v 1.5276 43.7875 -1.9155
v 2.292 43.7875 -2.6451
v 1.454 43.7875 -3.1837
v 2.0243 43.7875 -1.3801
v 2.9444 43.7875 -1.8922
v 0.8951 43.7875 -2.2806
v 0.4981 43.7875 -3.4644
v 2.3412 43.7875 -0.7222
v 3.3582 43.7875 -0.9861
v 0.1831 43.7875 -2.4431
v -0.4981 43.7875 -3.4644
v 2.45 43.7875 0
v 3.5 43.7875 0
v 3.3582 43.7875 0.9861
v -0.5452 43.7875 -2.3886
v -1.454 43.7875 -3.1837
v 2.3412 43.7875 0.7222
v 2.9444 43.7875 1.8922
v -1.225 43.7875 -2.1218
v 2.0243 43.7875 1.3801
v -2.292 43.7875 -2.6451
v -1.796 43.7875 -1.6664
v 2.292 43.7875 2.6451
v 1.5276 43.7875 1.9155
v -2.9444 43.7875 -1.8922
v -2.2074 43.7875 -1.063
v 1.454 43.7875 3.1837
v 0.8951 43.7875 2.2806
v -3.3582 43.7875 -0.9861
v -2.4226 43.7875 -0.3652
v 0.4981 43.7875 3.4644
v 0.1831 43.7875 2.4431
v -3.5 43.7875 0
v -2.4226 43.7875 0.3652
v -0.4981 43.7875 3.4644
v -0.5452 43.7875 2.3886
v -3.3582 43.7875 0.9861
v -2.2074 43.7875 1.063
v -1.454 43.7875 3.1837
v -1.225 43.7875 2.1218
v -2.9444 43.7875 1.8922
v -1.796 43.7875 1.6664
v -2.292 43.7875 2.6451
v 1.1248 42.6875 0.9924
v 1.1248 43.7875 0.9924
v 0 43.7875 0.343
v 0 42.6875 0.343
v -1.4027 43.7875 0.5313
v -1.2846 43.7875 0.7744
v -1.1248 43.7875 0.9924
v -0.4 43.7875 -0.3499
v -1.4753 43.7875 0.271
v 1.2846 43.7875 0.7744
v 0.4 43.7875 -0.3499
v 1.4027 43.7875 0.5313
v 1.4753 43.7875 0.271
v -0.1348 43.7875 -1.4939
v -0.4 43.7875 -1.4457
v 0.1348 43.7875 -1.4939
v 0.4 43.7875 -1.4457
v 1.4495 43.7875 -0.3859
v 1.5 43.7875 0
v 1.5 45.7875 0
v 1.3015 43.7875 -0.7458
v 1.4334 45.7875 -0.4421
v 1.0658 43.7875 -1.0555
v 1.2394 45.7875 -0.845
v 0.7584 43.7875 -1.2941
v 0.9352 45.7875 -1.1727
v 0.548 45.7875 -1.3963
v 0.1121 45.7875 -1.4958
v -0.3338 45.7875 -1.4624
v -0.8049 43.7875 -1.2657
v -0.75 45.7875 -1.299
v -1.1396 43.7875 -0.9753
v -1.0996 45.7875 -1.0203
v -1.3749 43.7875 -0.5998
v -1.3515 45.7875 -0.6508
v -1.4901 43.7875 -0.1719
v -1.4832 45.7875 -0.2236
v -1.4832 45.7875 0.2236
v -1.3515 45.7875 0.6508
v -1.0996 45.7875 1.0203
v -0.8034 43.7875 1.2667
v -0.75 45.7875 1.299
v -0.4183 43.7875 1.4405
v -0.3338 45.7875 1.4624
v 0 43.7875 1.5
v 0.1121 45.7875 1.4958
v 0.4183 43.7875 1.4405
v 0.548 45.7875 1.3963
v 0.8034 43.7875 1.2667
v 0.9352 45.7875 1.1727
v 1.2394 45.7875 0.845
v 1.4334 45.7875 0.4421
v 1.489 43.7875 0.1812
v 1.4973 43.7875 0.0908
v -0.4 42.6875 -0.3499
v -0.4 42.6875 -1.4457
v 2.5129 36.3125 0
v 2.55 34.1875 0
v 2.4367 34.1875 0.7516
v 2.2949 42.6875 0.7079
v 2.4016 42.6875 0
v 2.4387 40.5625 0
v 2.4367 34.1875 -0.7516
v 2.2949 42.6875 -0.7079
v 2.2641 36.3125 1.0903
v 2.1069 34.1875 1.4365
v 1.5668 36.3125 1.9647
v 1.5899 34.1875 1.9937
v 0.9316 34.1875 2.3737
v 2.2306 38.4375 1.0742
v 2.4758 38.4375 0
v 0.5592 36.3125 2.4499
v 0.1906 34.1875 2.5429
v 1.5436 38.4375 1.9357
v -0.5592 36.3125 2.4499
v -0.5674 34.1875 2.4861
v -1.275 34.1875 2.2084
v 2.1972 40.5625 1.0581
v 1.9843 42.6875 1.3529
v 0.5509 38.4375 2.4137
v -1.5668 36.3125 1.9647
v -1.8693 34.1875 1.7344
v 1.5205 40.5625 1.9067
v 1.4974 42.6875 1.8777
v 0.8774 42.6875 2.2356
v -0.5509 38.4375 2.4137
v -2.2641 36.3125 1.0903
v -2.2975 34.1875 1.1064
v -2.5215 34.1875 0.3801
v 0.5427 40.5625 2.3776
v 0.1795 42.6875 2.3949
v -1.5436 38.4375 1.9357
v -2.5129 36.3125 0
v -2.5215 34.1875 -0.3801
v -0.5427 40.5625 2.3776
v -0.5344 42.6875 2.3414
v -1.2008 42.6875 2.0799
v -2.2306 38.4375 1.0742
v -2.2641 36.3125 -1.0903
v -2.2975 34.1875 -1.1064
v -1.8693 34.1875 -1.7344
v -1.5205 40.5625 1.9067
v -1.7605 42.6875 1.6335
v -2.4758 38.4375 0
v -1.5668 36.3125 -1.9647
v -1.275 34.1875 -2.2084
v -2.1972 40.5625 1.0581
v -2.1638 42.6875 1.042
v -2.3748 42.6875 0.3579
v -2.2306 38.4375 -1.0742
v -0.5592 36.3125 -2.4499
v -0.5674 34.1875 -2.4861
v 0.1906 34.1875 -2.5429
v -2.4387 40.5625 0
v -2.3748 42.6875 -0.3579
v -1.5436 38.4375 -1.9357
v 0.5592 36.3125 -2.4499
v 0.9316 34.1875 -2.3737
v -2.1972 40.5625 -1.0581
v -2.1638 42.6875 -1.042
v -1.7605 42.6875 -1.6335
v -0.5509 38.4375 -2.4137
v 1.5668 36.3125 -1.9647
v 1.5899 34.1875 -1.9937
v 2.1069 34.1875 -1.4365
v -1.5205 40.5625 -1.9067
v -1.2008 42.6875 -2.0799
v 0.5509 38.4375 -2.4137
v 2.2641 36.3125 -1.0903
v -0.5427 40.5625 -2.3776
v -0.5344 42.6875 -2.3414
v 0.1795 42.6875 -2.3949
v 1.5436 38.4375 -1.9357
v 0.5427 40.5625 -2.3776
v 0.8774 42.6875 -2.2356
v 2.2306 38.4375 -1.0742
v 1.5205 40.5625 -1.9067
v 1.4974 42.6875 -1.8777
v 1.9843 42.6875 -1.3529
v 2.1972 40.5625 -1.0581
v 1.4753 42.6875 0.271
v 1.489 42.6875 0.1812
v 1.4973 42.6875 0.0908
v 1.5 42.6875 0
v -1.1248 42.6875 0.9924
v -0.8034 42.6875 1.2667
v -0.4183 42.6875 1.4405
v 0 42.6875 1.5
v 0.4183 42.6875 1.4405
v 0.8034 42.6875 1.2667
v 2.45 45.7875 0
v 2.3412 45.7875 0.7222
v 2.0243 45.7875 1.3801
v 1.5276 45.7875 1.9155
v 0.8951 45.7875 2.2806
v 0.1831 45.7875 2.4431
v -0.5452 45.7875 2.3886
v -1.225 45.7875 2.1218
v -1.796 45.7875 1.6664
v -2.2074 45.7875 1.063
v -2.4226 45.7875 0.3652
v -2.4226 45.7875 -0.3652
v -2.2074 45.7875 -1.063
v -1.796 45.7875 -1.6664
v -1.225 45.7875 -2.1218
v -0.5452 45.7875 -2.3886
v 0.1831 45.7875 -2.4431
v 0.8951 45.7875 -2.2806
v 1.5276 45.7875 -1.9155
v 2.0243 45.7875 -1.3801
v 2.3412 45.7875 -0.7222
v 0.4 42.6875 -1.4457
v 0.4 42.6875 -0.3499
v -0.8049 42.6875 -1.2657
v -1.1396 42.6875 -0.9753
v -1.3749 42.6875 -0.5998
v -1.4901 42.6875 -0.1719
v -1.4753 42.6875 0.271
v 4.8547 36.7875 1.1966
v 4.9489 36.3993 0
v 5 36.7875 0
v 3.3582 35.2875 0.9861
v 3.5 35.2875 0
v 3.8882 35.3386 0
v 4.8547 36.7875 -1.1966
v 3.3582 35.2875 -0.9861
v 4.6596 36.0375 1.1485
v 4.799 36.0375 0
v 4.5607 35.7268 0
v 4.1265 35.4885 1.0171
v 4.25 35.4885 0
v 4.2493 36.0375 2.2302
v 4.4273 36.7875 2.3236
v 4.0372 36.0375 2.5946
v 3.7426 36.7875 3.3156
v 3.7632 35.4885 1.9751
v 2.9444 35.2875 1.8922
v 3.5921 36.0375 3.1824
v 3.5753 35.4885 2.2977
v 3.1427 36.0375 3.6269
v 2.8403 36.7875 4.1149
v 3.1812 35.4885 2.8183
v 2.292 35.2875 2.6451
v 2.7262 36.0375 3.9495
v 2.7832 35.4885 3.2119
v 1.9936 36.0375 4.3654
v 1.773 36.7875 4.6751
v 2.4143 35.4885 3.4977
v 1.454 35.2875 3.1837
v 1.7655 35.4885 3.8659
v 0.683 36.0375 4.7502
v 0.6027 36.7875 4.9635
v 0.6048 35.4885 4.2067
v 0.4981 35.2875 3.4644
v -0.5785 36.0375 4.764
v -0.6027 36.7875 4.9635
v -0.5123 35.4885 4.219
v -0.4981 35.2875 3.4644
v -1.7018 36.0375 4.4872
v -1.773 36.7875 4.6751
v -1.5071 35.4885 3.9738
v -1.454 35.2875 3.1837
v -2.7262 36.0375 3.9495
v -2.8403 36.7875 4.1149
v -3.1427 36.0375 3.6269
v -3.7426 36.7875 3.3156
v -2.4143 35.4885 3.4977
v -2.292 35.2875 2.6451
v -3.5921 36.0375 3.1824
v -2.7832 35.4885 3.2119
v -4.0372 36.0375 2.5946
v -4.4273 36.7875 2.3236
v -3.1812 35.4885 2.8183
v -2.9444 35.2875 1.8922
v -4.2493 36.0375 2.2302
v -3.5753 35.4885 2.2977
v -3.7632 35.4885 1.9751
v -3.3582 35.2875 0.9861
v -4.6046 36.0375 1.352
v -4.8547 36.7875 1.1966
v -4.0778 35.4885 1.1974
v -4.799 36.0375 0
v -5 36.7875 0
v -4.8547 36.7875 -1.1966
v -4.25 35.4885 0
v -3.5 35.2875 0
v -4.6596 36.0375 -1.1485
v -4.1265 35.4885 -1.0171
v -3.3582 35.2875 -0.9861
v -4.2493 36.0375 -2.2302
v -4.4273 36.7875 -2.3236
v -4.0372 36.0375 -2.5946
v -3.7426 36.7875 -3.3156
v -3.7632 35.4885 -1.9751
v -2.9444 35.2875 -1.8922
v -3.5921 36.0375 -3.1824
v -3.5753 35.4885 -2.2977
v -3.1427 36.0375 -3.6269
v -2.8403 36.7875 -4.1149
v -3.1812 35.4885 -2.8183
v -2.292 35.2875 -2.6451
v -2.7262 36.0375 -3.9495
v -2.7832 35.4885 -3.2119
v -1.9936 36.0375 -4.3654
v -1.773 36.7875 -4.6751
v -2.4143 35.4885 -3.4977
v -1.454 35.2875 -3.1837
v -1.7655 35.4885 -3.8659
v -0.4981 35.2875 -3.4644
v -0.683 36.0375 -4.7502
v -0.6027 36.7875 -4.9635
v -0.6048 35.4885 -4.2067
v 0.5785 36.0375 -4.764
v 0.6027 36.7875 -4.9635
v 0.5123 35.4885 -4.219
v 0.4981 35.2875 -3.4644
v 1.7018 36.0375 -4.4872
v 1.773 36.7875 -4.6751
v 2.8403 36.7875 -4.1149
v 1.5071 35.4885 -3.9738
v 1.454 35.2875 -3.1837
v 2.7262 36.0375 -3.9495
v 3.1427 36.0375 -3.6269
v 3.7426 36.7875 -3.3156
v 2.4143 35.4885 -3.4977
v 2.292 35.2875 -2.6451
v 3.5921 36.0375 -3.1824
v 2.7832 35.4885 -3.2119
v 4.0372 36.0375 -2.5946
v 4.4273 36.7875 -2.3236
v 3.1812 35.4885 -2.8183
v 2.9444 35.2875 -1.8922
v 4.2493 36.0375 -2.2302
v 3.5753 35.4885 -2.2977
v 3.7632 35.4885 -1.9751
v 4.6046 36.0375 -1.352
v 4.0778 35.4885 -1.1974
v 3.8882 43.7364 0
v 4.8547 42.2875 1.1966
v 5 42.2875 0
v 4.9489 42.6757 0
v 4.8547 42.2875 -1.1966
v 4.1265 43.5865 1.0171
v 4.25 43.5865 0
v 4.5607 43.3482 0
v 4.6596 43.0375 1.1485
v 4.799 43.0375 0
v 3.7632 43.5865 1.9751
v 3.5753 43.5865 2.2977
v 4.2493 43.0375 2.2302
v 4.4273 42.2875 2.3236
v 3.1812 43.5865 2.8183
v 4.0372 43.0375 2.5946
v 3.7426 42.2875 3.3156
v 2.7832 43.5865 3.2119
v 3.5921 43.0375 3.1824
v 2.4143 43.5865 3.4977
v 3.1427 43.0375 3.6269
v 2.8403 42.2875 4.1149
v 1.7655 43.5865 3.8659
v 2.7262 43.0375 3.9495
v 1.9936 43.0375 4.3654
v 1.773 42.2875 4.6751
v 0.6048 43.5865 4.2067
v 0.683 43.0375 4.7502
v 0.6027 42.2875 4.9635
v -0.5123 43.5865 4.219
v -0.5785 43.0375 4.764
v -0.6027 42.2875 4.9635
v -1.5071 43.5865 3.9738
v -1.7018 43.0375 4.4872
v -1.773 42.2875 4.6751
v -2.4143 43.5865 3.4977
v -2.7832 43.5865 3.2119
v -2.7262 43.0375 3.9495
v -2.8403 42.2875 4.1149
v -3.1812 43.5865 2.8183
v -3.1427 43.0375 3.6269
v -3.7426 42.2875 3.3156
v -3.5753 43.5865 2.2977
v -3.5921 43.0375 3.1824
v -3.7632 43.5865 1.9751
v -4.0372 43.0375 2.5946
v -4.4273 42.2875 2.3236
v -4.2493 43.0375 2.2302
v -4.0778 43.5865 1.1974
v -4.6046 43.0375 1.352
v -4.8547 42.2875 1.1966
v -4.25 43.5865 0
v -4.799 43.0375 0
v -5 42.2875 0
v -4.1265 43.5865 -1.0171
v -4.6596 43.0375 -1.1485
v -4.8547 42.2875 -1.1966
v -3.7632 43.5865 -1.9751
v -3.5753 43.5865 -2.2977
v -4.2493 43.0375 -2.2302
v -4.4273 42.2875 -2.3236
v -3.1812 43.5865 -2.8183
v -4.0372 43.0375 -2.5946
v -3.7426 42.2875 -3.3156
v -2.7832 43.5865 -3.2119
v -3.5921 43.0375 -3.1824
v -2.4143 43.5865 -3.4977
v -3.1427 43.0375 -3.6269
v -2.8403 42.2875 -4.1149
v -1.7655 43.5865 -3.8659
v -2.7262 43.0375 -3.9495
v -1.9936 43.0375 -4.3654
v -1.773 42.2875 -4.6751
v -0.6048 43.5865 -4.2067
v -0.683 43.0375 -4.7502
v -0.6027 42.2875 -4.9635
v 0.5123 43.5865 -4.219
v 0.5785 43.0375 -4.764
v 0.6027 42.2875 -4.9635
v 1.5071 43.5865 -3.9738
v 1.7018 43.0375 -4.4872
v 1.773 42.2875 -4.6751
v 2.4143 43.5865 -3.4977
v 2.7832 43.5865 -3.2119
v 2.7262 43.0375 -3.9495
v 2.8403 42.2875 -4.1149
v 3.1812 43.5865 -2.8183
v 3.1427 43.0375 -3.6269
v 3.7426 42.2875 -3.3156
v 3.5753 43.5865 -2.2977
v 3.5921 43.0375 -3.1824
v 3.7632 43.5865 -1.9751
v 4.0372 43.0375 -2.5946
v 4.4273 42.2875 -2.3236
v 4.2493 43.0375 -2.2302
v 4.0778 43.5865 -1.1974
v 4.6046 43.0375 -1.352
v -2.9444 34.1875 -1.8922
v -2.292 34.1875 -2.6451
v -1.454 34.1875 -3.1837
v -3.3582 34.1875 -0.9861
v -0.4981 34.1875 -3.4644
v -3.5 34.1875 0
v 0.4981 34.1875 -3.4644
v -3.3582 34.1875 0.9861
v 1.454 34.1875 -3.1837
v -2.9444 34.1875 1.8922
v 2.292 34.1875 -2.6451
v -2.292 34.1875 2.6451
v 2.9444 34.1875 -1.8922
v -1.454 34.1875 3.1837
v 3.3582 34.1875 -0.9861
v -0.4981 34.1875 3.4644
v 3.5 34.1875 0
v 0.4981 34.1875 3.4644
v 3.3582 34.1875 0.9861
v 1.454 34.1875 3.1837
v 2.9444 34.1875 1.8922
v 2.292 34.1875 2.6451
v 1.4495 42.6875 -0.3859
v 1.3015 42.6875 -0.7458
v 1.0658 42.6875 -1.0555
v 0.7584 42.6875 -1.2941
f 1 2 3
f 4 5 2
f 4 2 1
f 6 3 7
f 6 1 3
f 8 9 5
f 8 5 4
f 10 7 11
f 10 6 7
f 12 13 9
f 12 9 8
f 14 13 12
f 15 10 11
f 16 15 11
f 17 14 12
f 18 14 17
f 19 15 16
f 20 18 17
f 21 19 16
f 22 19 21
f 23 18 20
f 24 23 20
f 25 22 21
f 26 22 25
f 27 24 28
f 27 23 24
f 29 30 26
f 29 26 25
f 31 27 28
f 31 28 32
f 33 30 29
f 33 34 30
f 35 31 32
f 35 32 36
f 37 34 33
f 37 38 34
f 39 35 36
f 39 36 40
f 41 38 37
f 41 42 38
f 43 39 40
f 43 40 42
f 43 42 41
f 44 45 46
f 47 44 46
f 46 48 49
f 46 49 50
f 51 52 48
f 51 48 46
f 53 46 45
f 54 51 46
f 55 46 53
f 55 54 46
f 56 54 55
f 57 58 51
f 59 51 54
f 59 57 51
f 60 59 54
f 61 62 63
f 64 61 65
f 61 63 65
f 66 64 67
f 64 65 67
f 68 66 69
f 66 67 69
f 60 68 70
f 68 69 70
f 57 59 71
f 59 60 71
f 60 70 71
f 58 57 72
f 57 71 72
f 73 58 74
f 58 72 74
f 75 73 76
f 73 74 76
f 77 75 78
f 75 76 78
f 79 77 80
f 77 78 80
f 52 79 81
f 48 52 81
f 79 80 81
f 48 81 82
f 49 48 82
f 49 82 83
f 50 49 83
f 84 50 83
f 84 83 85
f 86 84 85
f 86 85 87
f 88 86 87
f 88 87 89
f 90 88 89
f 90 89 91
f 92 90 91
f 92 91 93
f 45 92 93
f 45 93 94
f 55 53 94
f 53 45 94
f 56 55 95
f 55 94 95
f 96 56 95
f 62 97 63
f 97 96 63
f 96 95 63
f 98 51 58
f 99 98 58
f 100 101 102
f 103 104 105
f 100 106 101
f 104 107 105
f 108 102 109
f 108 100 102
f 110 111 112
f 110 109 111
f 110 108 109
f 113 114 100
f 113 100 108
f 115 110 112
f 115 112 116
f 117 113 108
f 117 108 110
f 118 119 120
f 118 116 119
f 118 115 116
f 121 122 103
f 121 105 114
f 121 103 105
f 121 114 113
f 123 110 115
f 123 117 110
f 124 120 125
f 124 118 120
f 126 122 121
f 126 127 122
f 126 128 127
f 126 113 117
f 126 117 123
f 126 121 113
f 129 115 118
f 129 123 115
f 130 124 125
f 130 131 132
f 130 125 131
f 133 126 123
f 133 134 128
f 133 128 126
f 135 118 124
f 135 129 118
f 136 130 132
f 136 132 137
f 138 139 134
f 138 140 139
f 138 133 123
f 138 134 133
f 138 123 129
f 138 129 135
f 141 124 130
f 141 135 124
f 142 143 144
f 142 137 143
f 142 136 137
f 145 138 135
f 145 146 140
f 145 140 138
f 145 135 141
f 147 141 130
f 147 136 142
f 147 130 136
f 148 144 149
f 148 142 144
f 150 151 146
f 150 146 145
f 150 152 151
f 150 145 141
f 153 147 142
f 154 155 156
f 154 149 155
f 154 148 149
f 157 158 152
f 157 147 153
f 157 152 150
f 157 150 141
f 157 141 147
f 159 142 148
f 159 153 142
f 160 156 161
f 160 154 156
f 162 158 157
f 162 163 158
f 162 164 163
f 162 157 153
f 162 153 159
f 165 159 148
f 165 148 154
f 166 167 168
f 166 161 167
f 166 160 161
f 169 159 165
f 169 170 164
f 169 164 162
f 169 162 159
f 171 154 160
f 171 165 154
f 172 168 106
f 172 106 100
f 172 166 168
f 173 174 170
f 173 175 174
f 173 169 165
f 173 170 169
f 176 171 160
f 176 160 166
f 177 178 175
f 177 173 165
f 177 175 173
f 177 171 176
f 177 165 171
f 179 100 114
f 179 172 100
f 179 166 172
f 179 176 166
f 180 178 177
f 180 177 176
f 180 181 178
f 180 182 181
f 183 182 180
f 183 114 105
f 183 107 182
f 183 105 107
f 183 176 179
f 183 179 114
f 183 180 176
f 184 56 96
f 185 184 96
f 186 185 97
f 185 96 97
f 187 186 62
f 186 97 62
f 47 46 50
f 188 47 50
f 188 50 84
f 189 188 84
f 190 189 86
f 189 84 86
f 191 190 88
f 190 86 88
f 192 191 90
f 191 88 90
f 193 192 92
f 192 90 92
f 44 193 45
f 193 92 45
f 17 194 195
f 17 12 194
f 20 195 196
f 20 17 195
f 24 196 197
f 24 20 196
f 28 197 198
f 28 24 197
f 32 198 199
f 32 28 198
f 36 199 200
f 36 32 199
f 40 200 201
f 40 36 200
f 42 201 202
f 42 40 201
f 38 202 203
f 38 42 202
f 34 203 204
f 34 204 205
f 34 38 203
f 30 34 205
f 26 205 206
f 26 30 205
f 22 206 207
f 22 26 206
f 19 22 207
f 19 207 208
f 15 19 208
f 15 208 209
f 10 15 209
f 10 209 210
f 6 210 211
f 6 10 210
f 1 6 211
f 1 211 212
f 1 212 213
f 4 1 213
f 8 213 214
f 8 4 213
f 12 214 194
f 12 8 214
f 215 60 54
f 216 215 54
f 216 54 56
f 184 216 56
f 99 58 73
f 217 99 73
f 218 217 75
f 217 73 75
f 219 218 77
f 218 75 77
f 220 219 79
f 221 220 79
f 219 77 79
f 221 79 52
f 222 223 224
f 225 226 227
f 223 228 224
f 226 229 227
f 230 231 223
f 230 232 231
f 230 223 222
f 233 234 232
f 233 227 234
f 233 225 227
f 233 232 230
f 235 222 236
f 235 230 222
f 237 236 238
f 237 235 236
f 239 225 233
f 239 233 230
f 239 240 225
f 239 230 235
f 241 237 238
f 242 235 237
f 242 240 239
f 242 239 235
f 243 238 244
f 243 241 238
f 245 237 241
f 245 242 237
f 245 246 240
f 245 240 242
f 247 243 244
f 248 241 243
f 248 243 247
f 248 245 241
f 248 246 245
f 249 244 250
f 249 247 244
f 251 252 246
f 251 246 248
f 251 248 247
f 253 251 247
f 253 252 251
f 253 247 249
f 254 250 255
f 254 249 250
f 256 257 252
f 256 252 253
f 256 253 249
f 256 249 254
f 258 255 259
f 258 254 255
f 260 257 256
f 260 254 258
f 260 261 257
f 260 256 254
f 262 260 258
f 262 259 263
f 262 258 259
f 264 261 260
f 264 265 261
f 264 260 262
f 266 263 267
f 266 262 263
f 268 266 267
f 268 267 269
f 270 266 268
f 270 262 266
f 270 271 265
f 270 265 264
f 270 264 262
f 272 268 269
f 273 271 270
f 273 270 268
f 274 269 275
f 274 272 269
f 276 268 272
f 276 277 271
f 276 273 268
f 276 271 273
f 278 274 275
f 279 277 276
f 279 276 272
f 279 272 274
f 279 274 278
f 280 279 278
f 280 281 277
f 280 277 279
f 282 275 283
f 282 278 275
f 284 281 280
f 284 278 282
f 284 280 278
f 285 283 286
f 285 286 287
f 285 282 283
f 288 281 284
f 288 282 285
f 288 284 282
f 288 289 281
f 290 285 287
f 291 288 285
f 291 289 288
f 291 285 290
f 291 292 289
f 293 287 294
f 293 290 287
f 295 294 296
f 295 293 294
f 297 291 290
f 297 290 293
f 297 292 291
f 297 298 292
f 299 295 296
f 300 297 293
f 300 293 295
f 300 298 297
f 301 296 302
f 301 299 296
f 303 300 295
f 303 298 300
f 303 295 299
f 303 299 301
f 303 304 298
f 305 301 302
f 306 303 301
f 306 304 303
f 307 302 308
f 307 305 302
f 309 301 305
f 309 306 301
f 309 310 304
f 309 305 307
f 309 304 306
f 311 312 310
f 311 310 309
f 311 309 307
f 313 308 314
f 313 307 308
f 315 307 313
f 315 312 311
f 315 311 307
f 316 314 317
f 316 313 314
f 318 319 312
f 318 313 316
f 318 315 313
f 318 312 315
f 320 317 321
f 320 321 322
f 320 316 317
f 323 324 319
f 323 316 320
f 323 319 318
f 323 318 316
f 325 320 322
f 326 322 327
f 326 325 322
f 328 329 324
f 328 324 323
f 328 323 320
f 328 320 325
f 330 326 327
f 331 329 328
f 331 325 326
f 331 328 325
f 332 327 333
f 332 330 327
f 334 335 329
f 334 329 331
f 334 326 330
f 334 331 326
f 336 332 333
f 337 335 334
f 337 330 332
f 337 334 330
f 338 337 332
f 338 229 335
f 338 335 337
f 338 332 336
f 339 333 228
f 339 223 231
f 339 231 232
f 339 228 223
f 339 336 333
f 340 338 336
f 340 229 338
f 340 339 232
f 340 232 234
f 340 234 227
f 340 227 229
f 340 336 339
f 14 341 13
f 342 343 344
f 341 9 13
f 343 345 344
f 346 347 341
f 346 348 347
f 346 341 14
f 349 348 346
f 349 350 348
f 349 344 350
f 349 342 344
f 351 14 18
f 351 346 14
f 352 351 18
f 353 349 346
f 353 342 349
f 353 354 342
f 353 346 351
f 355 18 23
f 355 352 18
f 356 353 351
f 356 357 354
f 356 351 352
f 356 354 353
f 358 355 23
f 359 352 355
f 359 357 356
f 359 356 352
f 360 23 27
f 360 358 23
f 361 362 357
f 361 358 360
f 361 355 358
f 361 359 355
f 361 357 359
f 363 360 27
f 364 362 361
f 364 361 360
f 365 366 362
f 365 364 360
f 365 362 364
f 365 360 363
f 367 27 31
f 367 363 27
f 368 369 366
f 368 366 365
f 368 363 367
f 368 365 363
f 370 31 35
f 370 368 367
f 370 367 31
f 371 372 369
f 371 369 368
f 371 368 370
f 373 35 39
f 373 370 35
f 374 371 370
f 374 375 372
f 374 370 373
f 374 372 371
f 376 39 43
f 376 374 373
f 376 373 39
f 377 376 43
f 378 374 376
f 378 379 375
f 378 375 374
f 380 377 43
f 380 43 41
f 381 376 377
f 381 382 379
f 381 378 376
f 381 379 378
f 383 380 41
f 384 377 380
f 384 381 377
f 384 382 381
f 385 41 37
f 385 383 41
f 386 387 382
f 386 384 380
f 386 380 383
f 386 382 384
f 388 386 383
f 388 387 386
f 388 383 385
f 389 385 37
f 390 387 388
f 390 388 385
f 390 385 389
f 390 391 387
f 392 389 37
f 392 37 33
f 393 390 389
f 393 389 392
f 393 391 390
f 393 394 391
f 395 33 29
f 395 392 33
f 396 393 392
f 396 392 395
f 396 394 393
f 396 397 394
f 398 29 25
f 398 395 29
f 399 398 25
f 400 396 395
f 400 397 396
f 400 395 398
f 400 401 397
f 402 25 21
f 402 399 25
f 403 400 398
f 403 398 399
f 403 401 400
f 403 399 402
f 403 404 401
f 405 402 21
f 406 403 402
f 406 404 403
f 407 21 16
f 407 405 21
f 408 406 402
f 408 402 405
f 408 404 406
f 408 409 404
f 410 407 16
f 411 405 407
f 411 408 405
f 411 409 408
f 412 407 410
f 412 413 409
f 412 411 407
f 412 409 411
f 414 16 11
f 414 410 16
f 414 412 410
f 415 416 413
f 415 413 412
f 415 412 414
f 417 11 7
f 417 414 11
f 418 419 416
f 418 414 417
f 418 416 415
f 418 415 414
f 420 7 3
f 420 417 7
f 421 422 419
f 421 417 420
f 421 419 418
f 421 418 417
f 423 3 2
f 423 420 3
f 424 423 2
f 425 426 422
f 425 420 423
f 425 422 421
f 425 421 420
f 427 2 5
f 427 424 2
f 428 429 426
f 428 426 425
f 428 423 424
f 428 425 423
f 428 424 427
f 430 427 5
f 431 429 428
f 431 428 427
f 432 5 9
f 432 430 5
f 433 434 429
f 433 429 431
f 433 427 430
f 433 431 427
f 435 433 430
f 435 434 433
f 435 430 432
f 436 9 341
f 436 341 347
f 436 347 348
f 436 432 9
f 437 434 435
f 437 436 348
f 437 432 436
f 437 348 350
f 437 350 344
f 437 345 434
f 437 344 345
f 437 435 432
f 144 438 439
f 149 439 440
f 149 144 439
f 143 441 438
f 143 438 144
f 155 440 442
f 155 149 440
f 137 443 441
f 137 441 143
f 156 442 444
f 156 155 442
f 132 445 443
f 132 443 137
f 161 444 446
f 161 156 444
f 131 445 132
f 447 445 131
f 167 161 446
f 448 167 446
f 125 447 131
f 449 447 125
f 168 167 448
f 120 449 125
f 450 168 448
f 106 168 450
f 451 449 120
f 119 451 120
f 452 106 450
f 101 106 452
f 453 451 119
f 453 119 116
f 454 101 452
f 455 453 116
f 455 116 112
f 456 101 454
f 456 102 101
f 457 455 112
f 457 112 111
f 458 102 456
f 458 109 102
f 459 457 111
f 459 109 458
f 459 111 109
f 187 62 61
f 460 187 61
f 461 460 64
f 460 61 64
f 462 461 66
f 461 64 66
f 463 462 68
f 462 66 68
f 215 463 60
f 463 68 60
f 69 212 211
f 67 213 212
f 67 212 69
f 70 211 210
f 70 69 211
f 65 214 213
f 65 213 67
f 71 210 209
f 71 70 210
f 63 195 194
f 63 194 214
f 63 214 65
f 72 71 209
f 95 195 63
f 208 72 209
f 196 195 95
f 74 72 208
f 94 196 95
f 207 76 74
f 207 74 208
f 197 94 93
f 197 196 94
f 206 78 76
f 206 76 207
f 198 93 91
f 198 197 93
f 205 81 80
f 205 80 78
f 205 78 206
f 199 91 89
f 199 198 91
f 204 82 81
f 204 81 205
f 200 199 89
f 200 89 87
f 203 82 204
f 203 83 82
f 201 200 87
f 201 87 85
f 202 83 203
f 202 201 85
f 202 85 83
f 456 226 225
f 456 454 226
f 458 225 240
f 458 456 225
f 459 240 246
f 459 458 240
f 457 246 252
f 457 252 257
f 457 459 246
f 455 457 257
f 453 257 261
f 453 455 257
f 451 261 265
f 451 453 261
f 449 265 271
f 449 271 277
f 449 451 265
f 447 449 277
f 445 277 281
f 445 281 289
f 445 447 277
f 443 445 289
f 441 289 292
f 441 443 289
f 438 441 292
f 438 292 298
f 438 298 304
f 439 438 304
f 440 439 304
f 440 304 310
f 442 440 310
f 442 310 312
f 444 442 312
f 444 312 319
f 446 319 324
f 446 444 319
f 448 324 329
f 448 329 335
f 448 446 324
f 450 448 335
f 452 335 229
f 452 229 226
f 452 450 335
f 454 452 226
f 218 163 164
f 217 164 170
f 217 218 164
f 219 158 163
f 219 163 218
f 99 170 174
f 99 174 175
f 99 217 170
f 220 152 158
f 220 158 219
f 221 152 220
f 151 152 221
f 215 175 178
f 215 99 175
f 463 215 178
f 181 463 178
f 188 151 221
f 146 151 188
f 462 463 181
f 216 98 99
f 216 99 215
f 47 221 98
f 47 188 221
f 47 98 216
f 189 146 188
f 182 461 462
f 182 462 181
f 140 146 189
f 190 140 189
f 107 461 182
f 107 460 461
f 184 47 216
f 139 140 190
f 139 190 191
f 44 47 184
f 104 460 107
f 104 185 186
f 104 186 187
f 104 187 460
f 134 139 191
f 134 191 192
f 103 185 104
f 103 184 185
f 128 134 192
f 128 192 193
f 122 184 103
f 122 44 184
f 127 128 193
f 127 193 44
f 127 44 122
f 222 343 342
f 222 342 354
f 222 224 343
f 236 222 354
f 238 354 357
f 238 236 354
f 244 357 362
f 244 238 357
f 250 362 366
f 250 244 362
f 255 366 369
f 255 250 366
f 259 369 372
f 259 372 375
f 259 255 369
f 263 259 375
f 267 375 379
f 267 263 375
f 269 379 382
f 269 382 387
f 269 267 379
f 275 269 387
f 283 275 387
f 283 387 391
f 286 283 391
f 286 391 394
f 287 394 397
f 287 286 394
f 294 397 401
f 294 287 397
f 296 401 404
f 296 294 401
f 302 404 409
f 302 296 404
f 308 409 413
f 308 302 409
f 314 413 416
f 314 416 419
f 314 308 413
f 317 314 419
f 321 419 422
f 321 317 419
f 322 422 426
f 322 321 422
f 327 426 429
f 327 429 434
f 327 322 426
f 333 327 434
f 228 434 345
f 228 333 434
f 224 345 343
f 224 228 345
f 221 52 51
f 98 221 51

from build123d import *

# Parameters (mm, degrees)
SKETCH8_R               = 2.55
CUT_EXTRUDE1_DEPTH      = 8.5
CUT_EXTRUDE1_TAPER      = 1
SKETCH9_R               = 1.5
CUT_EXTRUDE2_DEPTH      = 2
CUT_EXTRUDE5_DEPTH      = 3
CUT_EXTRUDE5_DEPTH_BACK = 10.6000001


with BuildPart() as part:
    # Sketch1 → Revolve1 (revolve)
    with BuildSketch(Plane.XY):
        with BuildLine():
            Line((0, 45.78749956), (2.45, 45.78749956))
            Line((2.45, 45.78749956), (2.45, 43.78749956))
            Line((2.45, 43.78749956), (3.5, 43.78749956))
            ThreePointArc((3.5, 43.78749956), (4.560660172, 43.348159732), (5, 42.28749956))
            Line((5, 42.28749956), (5, 36.78749956))
            ThreePointArc((5, 36.78749956), (4.560660172, 35.726839388), (3.5, 35.28749956))
            Line((3.5, 35.28749956), (3.5, 34.18749956))
            Line((3.5, 34.18749956), (0, 34.18749956))
            Line((0, 34.18749956), (0, 45.78749956))
        make_face()
    revolve(axis=Axis((0, 45.78749956, 0), (0, -1, 0)))

    # Sketch8 → Cut-Extrude1 (cut)
    with BuildSketch(Plane.XZ.offset(-34.18749956)):
        Circle(SKETCH8_R)
    extrude(amount=-CUT_EXTRUDE1_DEPTH, taper=CUT_EXTRUDE1_TAPER, mode=Mode.SUBTRACT)

    # Sketch9 → Cut-Extrude2 (cut)
    with BuildSketch(Plane(origin=(0, 45.78749956, 0), x_dir=(1, 0, 0), z_dir=(0, 1, 0))):
        Circle(SKETCH9_R)
    extrude(amount=-CUT_EXTRUDE2_DEPTH, mode=Mode.SUBTRACT)

    # Sketch10 → Cut-Extrude5 (cut, two sides)
    with BuildSketch(Plane(origin=(0, 43.78749956, 0), x_dir=(1, 0, 0), z_dir=(0, 1, 0))) as cut_extrude5_sk:
        with BuildLine():
            Line((-0.4, 0.349856808), (-0.4, 1.445683229))
            ThreePointArc((-0.4, 1.445683229), (-1.271196067, 0.796279197), (-1.475320312, -0.270979664))
            Line((-1.475320312, -0.270979664), (-0.4, 0.349856808))
        make_face()
        with BuildLine():
            ThreePointArc((1.5, 0), (1.193733639, 0.908295106), (0.4, 1.445683229))
            Line((0.4, 1.445683229), (0.4, 0.349856808))
            Line((0.4, 0.349856808), (1.475320312, -0.270979664))
            ThreePointArc((1.475320312, -0.270979664), (1.493817336, -0.136050602), (1.5, 0))
        make_face()
        with BuildLine():
            Line((0, -0.342963515), (-1.124809572, -0.992372625))
            ThreePointArc((-1.124809572, -0.992372625), (0, -1.5), (1.124809572, -0.992372625))
            Line((1.124809572, -0.992372625), (0, -0.342963515))
        make_face()
    extrude(amount=CUT_EXTRUDE5_DEPTH, mode=Mode.SUBTRACT)
    extrude(cut_extrude5_sk.sketch, amount=-CUT_EXTRUDE5_DEPTH_BACK, mode=Mode.SUBTRACT)


solid = part.part
